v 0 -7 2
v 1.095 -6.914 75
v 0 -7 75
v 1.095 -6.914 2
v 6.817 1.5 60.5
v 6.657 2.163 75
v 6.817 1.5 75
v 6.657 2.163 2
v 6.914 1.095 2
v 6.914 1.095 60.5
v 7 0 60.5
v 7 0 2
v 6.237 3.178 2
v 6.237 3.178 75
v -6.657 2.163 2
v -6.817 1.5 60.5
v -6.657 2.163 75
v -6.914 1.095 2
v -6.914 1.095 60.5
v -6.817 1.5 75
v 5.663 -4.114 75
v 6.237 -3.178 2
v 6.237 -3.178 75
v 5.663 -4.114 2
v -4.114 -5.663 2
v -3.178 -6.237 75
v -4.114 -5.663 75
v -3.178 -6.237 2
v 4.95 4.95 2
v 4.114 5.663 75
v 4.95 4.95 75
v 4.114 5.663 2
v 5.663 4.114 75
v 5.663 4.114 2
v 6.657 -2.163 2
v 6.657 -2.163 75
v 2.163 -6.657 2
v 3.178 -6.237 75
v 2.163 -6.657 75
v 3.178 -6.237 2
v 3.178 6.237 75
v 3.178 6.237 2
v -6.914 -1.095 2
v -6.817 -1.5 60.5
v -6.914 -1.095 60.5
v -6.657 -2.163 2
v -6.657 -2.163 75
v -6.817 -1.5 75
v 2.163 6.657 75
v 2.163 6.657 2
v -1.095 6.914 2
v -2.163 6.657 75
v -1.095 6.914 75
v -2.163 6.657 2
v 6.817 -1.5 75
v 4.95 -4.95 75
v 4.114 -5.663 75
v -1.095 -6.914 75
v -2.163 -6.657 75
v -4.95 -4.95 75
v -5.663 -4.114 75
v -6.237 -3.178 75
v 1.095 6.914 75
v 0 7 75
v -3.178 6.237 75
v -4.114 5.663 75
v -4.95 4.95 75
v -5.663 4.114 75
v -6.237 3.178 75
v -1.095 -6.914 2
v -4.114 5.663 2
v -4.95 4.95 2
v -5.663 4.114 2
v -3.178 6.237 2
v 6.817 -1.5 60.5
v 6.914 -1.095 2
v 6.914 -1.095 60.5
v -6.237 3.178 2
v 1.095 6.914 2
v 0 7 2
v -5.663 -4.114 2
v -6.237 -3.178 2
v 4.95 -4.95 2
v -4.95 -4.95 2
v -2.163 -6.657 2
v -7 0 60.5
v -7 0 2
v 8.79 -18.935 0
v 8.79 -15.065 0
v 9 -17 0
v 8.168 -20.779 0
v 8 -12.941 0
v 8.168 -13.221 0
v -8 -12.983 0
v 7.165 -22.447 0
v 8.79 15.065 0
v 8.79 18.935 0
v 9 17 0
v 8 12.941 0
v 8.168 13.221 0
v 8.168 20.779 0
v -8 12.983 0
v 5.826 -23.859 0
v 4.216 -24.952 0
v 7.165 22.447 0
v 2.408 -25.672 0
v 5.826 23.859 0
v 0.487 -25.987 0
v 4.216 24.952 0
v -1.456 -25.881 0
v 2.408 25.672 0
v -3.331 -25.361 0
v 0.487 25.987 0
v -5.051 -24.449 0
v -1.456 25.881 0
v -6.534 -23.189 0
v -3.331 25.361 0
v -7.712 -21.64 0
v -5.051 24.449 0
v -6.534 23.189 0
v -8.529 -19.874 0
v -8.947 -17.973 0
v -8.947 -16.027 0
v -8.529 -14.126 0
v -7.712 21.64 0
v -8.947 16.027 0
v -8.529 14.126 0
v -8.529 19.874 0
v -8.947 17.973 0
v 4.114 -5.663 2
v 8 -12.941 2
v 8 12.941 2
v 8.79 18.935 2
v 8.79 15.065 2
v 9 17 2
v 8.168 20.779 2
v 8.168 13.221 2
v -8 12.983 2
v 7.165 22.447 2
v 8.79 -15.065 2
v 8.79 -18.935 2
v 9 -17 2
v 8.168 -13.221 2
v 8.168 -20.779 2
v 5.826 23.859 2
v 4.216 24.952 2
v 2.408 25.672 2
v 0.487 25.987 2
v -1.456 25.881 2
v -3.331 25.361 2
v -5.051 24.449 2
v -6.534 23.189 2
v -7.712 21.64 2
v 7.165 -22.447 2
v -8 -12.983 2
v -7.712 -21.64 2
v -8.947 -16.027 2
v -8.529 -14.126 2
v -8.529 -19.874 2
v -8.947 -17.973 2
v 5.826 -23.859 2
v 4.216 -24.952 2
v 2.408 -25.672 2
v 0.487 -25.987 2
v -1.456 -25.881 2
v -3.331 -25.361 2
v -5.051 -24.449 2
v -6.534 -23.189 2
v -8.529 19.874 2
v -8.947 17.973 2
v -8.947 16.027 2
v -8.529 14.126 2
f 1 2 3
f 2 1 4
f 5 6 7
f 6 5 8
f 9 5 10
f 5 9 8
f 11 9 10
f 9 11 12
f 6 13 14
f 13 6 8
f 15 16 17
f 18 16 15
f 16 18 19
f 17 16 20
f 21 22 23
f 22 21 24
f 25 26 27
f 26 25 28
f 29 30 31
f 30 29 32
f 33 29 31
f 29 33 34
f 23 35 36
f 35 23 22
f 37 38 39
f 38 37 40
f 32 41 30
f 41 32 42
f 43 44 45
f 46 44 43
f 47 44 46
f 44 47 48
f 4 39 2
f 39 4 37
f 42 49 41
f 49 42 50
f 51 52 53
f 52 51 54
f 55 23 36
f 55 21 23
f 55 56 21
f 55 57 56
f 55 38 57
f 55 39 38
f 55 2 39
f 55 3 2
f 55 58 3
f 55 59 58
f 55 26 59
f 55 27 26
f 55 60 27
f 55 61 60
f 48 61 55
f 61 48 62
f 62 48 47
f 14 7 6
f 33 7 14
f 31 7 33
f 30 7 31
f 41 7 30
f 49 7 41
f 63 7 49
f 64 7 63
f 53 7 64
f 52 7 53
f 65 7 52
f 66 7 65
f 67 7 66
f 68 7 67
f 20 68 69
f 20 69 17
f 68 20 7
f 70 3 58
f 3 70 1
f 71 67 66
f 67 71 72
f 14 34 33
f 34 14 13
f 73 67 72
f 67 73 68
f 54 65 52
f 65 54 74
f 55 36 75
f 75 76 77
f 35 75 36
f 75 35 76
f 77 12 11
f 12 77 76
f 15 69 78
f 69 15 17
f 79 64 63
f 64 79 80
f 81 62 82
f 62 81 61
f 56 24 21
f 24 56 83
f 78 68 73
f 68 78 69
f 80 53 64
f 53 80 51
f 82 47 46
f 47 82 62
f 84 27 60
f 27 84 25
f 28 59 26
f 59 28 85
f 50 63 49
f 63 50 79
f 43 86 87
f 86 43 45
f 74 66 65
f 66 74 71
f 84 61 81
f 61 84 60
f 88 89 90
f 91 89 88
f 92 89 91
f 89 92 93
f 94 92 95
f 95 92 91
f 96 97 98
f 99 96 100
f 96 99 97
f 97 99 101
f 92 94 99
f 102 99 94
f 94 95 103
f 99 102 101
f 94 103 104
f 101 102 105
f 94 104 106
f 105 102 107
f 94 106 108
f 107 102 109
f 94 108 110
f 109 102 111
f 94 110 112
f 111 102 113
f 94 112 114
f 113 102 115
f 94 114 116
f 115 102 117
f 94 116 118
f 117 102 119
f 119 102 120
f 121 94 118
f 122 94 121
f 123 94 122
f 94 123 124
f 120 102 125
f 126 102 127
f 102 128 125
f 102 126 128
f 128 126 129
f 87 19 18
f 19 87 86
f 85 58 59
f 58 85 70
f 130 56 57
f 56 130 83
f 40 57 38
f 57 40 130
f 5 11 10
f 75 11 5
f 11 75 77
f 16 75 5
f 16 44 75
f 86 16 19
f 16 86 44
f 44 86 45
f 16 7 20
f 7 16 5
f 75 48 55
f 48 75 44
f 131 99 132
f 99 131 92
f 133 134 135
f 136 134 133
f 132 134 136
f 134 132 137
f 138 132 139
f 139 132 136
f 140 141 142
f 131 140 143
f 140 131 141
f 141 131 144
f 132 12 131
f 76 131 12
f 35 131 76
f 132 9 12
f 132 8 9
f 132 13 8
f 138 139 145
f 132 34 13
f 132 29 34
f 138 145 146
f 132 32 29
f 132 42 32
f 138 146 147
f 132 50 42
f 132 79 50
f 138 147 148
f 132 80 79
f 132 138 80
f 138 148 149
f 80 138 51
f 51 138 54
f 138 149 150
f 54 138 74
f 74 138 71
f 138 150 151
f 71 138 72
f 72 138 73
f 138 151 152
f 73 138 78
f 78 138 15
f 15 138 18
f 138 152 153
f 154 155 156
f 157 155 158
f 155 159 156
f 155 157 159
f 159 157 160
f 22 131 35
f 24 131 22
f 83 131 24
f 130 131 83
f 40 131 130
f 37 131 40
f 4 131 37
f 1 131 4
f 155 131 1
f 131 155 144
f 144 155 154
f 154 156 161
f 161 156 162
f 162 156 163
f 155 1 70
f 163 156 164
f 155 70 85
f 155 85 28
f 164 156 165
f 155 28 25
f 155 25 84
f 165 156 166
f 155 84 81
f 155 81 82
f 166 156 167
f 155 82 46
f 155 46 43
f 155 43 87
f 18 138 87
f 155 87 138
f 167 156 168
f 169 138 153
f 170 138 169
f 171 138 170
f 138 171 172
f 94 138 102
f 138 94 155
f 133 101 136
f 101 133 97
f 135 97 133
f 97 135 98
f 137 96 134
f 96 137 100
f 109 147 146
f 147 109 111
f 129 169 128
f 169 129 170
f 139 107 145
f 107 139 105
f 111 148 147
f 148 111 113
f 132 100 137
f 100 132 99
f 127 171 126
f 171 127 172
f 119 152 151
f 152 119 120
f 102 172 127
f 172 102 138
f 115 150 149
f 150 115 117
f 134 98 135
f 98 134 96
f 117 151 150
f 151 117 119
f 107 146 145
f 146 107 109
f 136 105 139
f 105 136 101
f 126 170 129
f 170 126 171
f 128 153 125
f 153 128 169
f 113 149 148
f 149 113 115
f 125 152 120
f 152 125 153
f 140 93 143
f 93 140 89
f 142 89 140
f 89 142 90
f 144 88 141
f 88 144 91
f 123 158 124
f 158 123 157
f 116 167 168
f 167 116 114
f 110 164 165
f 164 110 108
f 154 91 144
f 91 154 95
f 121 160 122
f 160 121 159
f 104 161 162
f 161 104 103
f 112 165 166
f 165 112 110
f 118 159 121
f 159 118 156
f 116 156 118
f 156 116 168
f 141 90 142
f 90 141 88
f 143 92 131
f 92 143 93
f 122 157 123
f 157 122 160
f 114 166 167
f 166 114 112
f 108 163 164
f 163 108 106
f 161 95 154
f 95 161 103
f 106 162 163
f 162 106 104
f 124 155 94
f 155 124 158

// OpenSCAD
//Height of plug follower, if base is generated this height includes the base
plug_follower_height = 75;
//Diameter of plug follower
plug_follower_diameter = 14;
//Generate base plate, 0 = no base, 1 = base
generate_base = 1;
//Height of Base, 2mm default
base_height = 2;
//Type of follower 1 = center notch, 2 = Half moon, 3 = Hollow
plug_follower_type = 1;
//Determines width of notch for type 1 followers and width of keyway for type 3 followers
notch_width = 3;
//Determines depth of reccess for all types
notch_depth = 15;

module plug_notch(){
    translate([0,0,plug_follower_height+1-notch_depth+(notch_depth/2)]) cube([plug_follower_diameter+2,notch_width,notch_depth+1],center=true);
}

module plug_moon(){
    translate([0,(plug_follower_diameter/2)/2,plug_follower_height+1-notch_depth+(notch_depth/2)]) cube([plug_follower_diameter+2,plug_follower_diameter/2,notch_depth+1],center=true);
}

module plug_hollow(){
    translate([0,0,plug_follower_height-notch_depth]) cylinder(r=(plug_follower_diameter-1)/2,h=notch_depth+1,$fn=40);
    
    translate([(plug_follower_diameter-1)/2,0,(plug_follower_height-notch_depth)+(notch_depth/2)+1]) cube([notch_width,notch_width,notch_depth+1],center=true);
}

module make_base(){
translate([0,0,base_height/2]) cube([plug_follower_diameter + 2, plug_follower_diameter + 20, base_height],center=true);
translate([0,(plug_follower_diameter + 20)/2,0]) cylinder(r=(plug_follower_diameter + 4)/2,h=base_height);
translate([0,-((plug_follower_diameter + 20)/2),0]) cylinder(r=(plug_follower_diameter + 4)/2,h=base_height);
}

difference(){
cylinder(r=plug_follower_diameter/2,plug_follower_height,$fn=40);

if (plug_follower_type==1) plug_notch();
if (plug_follower_type==2) plug_moon();
if (plug_follower_type==3) plug_hollow();
}

if (generate_base==1) make_base();
 
